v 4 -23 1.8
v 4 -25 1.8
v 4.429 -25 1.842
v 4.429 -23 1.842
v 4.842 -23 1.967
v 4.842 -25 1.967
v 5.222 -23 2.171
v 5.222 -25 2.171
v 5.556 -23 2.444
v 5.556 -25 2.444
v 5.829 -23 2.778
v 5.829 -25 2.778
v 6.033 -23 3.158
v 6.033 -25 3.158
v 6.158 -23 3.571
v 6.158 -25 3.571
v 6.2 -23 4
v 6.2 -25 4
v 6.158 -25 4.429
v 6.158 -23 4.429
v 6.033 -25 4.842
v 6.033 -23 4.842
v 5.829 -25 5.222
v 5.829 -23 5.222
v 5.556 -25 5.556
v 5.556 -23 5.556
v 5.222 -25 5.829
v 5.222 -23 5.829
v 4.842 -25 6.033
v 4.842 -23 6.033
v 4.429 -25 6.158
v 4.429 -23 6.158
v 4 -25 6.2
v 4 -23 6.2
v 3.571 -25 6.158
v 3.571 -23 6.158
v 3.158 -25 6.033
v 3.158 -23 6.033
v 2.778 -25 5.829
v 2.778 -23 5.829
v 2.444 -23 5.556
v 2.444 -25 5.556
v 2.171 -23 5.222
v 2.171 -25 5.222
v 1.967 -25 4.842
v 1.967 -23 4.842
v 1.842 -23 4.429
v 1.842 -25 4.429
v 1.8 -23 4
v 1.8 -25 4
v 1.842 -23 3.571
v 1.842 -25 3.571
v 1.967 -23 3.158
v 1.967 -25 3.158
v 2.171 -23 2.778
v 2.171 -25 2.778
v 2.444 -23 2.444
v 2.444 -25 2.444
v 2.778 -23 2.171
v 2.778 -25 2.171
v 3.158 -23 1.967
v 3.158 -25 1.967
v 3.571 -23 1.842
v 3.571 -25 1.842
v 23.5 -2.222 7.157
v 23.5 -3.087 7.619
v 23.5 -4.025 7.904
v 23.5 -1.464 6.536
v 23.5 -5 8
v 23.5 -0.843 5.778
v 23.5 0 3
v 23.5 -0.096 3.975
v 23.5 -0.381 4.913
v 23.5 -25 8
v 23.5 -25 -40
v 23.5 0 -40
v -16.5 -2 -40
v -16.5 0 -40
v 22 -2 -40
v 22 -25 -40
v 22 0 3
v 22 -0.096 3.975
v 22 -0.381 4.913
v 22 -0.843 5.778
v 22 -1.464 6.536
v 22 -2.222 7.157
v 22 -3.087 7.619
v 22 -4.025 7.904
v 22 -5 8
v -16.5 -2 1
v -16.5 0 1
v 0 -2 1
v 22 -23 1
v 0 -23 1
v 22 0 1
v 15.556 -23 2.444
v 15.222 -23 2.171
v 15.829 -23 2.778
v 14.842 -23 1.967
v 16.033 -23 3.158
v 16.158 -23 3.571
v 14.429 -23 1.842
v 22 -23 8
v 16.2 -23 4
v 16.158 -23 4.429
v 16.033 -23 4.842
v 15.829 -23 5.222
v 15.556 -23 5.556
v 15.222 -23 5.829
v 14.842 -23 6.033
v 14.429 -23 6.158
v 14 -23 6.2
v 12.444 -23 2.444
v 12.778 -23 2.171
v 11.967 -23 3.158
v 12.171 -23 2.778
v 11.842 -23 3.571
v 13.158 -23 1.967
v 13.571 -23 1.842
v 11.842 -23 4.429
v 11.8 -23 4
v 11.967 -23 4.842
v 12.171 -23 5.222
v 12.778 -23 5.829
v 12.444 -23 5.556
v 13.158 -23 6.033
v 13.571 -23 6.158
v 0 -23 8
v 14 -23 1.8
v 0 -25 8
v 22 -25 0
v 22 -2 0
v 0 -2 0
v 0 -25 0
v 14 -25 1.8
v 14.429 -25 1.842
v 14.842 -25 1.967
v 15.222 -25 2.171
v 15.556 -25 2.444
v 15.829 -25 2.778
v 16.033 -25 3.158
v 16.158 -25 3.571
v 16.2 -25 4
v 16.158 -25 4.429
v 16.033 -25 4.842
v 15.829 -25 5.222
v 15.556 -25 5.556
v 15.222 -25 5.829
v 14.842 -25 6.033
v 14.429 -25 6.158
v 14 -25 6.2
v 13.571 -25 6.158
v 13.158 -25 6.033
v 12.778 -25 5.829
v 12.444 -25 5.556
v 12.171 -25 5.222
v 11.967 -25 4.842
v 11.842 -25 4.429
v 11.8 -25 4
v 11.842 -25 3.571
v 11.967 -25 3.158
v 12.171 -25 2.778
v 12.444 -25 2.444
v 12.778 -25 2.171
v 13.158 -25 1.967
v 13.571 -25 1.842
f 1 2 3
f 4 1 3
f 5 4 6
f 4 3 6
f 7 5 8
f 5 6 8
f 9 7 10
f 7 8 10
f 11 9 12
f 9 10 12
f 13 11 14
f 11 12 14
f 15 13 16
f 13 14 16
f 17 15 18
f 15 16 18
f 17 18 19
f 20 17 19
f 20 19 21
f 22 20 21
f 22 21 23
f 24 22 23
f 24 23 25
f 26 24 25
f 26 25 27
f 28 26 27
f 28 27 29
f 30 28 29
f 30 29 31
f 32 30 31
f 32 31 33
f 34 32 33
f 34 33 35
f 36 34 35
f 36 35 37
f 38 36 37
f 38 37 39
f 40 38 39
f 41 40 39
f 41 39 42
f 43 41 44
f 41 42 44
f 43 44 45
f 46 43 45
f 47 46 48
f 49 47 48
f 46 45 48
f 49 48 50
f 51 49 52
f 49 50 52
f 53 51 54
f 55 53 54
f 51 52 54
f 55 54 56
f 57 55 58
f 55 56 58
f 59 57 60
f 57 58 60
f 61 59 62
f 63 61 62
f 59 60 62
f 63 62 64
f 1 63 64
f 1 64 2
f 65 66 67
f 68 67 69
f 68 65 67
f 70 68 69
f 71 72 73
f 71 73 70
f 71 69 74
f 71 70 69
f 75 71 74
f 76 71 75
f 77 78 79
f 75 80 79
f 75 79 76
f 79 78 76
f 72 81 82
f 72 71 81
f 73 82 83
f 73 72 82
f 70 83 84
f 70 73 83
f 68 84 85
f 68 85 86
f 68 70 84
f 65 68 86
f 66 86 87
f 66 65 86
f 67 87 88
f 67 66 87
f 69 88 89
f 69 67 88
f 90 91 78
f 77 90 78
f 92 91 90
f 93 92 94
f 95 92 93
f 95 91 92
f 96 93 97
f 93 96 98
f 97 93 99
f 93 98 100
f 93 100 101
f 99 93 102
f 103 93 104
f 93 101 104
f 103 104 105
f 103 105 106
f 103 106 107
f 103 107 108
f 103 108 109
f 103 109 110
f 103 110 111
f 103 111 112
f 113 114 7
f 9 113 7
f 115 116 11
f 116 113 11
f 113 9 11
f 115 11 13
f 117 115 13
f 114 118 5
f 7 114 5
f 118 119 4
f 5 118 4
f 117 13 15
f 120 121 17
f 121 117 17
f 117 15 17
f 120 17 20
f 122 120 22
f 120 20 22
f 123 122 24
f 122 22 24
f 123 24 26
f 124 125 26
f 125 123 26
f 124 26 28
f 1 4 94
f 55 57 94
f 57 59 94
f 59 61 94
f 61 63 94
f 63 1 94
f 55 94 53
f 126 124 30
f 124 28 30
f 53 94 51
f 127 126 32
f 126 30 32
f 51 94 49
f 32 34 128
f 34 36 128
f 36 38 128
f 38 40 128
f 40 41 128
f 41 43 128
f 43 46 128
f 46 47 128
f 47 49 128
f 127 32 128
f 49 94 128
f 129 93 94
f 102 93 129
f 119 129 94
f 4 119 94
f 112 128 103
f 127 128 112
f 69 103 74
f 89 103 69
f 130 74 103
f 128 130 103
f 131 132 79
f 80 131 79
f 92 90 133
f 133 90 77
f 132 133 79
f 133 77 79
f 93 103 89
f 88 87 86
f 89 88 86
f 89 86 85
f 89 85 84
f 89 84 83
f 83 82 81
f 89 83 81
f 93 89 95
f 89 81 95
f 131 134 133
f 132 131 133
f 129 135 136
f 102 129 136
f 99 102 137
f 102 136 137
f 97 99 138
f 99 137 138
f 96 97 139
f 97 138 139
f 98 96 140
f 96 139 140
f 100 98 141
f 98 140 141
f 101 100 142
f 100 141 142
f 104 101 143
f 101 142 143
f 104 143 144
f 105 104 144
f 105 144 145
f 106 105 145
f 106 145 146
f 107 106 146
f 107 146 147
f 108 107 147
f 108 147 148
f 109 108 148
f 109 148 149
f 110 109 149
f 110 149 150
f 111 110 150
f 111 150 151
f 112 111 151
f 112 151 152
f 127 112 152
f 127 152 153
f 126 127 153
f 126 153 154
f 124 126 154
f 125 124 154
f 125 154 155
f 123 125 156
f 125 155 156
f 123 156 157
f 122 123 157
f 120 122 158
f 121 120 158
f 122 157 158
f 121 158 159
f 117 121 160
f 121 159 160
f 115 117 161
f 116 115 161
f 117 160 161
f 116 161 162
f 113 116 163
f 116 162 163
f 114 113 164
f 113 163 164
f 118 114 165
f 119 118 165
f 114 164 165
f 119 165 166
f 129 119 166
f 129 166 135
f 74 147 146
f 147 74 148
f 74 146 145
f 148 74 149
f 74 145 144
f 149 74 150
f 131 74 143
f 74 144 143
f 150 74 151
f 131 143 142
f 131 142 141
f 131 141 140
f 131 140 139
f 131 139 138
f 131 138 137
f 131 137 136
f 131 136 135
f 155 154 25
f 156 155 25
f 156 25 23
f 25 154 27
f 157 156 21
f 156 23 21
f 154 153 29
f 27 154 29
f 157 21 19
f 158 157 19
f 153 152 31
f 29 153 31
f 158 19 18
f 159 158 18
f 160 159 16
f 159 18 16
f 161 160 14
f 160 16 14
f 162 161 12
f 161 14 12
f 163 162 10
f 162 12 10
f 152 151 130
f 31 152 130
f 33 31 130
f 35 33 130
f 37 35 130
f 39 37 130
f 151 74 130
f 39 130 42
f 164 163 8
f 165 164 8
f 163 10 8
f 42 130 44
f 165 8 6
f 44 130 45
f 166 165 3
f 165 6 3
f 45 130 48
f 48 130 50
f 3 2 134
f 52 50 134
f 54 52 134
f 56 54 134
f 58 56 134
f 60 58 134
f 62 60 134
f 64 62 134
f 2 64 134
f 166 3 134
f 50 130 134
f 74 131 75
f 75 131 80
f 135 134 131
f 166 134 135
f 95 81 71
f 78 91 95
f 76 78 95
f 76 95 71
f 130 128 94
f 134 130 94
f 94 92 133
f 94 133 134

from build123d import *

# Parameters (mm, degrees)
BOSS_EXTRUDE1_DEPTH = 22
SKETCH4_W           = 48
SKETCH4_H           = 25
BOSS_EXTRUDE3_DEPTH = 1.5
SKETCH5_W           = 40
SKETCH5_H           = 41
BOSS_EXTRUDE4_DEPTH = 2
CUT_EXTRUDE2_REACH  = 54.7
SKETCH6_R           = 2.2
LPATTERN2_COUNT     = 2
LPATTERN2_PITCH     = 10
FILLET2_R           = 5


with BuildPart() as part:
    # Sketch1 → Boss-Extrude1 (new body)
    with BuildSketch(Plane(origin=(0, 0, 0), x_dir=(0, 0, -1), z_dir=(1, 0, 0))):
        Polygon((-8, -25), (0, -25), (0, 0), (-1, 0), (-1, -23), (-8, -23), align=None)
    extrude(amount=BOSS_EXTRUDE1_DEPTH)

    # Sketch4 → Boss-Extrude3 (add)
    with BuildSketch(Plane(origin=(22, 0, 0), x_dir=(0, 0, -1), z_dir=(1, 0, 0))):
        with Locations((16, -12.5)):
            Rectangle(SKETCH4_W, SKETCH4_H)
    extrude(amount=BOSS_EXTRUDE3_DEPTH)

    # Sketch5 → Boss-Extrude4 (add)
    with BuildSketch(Plane(origin=(0, 0, 0), x_dir=(1, 0, 0), z_dir=(0, 1, 0))):
        with Locations((3.5, 19.5)):
            Rectangle(SKETCH5_W, SKETCH5_H)
    extrude(amount=-BOSS_EXTRUDE4_DEPTH)

    # Sketch6 → Cut-Extrude2 (cut, up to next)
    with BuildSketch(Plane.XZ.offset(25), mode=Mode.PRIVATE) as cut_extrude2_sk1:
        with Locations(Location((14, 4, 0), (0, 0, 270))):
            Circle(SKETCH6_R)
    cut_extrude2_tool1 = extrude(cut_extrude2_sk1.sketch, amount=-CUT_EXTRUDE2_REACH, mode=Mode.PRIVATE) & part.part
    cut_extrude2 = cut_extrude2_tool1.solids().sort_by_distance((14, -25, 4))[0]
    add(cut_extrude2, mode=Mode.SUBTRACT)

    # LPattern2: Cut-Extrude2 ×2
    with Locations(*[(-i * LPATTERN2_PITCH, 0, 0) for i in range(1, LPATTERN2_COUNT)]):
        add(cut_extrude2, mode=Mode.SUBTRACT)

    # Fillet2
    fillet2_edges = [part.edges().sort_by_distance(p)[0] for p in [
        (22.75, 0, 8),
    ]]
    fillet(fillet2_edges, radius=FILLET2_R)


solid = part.part
